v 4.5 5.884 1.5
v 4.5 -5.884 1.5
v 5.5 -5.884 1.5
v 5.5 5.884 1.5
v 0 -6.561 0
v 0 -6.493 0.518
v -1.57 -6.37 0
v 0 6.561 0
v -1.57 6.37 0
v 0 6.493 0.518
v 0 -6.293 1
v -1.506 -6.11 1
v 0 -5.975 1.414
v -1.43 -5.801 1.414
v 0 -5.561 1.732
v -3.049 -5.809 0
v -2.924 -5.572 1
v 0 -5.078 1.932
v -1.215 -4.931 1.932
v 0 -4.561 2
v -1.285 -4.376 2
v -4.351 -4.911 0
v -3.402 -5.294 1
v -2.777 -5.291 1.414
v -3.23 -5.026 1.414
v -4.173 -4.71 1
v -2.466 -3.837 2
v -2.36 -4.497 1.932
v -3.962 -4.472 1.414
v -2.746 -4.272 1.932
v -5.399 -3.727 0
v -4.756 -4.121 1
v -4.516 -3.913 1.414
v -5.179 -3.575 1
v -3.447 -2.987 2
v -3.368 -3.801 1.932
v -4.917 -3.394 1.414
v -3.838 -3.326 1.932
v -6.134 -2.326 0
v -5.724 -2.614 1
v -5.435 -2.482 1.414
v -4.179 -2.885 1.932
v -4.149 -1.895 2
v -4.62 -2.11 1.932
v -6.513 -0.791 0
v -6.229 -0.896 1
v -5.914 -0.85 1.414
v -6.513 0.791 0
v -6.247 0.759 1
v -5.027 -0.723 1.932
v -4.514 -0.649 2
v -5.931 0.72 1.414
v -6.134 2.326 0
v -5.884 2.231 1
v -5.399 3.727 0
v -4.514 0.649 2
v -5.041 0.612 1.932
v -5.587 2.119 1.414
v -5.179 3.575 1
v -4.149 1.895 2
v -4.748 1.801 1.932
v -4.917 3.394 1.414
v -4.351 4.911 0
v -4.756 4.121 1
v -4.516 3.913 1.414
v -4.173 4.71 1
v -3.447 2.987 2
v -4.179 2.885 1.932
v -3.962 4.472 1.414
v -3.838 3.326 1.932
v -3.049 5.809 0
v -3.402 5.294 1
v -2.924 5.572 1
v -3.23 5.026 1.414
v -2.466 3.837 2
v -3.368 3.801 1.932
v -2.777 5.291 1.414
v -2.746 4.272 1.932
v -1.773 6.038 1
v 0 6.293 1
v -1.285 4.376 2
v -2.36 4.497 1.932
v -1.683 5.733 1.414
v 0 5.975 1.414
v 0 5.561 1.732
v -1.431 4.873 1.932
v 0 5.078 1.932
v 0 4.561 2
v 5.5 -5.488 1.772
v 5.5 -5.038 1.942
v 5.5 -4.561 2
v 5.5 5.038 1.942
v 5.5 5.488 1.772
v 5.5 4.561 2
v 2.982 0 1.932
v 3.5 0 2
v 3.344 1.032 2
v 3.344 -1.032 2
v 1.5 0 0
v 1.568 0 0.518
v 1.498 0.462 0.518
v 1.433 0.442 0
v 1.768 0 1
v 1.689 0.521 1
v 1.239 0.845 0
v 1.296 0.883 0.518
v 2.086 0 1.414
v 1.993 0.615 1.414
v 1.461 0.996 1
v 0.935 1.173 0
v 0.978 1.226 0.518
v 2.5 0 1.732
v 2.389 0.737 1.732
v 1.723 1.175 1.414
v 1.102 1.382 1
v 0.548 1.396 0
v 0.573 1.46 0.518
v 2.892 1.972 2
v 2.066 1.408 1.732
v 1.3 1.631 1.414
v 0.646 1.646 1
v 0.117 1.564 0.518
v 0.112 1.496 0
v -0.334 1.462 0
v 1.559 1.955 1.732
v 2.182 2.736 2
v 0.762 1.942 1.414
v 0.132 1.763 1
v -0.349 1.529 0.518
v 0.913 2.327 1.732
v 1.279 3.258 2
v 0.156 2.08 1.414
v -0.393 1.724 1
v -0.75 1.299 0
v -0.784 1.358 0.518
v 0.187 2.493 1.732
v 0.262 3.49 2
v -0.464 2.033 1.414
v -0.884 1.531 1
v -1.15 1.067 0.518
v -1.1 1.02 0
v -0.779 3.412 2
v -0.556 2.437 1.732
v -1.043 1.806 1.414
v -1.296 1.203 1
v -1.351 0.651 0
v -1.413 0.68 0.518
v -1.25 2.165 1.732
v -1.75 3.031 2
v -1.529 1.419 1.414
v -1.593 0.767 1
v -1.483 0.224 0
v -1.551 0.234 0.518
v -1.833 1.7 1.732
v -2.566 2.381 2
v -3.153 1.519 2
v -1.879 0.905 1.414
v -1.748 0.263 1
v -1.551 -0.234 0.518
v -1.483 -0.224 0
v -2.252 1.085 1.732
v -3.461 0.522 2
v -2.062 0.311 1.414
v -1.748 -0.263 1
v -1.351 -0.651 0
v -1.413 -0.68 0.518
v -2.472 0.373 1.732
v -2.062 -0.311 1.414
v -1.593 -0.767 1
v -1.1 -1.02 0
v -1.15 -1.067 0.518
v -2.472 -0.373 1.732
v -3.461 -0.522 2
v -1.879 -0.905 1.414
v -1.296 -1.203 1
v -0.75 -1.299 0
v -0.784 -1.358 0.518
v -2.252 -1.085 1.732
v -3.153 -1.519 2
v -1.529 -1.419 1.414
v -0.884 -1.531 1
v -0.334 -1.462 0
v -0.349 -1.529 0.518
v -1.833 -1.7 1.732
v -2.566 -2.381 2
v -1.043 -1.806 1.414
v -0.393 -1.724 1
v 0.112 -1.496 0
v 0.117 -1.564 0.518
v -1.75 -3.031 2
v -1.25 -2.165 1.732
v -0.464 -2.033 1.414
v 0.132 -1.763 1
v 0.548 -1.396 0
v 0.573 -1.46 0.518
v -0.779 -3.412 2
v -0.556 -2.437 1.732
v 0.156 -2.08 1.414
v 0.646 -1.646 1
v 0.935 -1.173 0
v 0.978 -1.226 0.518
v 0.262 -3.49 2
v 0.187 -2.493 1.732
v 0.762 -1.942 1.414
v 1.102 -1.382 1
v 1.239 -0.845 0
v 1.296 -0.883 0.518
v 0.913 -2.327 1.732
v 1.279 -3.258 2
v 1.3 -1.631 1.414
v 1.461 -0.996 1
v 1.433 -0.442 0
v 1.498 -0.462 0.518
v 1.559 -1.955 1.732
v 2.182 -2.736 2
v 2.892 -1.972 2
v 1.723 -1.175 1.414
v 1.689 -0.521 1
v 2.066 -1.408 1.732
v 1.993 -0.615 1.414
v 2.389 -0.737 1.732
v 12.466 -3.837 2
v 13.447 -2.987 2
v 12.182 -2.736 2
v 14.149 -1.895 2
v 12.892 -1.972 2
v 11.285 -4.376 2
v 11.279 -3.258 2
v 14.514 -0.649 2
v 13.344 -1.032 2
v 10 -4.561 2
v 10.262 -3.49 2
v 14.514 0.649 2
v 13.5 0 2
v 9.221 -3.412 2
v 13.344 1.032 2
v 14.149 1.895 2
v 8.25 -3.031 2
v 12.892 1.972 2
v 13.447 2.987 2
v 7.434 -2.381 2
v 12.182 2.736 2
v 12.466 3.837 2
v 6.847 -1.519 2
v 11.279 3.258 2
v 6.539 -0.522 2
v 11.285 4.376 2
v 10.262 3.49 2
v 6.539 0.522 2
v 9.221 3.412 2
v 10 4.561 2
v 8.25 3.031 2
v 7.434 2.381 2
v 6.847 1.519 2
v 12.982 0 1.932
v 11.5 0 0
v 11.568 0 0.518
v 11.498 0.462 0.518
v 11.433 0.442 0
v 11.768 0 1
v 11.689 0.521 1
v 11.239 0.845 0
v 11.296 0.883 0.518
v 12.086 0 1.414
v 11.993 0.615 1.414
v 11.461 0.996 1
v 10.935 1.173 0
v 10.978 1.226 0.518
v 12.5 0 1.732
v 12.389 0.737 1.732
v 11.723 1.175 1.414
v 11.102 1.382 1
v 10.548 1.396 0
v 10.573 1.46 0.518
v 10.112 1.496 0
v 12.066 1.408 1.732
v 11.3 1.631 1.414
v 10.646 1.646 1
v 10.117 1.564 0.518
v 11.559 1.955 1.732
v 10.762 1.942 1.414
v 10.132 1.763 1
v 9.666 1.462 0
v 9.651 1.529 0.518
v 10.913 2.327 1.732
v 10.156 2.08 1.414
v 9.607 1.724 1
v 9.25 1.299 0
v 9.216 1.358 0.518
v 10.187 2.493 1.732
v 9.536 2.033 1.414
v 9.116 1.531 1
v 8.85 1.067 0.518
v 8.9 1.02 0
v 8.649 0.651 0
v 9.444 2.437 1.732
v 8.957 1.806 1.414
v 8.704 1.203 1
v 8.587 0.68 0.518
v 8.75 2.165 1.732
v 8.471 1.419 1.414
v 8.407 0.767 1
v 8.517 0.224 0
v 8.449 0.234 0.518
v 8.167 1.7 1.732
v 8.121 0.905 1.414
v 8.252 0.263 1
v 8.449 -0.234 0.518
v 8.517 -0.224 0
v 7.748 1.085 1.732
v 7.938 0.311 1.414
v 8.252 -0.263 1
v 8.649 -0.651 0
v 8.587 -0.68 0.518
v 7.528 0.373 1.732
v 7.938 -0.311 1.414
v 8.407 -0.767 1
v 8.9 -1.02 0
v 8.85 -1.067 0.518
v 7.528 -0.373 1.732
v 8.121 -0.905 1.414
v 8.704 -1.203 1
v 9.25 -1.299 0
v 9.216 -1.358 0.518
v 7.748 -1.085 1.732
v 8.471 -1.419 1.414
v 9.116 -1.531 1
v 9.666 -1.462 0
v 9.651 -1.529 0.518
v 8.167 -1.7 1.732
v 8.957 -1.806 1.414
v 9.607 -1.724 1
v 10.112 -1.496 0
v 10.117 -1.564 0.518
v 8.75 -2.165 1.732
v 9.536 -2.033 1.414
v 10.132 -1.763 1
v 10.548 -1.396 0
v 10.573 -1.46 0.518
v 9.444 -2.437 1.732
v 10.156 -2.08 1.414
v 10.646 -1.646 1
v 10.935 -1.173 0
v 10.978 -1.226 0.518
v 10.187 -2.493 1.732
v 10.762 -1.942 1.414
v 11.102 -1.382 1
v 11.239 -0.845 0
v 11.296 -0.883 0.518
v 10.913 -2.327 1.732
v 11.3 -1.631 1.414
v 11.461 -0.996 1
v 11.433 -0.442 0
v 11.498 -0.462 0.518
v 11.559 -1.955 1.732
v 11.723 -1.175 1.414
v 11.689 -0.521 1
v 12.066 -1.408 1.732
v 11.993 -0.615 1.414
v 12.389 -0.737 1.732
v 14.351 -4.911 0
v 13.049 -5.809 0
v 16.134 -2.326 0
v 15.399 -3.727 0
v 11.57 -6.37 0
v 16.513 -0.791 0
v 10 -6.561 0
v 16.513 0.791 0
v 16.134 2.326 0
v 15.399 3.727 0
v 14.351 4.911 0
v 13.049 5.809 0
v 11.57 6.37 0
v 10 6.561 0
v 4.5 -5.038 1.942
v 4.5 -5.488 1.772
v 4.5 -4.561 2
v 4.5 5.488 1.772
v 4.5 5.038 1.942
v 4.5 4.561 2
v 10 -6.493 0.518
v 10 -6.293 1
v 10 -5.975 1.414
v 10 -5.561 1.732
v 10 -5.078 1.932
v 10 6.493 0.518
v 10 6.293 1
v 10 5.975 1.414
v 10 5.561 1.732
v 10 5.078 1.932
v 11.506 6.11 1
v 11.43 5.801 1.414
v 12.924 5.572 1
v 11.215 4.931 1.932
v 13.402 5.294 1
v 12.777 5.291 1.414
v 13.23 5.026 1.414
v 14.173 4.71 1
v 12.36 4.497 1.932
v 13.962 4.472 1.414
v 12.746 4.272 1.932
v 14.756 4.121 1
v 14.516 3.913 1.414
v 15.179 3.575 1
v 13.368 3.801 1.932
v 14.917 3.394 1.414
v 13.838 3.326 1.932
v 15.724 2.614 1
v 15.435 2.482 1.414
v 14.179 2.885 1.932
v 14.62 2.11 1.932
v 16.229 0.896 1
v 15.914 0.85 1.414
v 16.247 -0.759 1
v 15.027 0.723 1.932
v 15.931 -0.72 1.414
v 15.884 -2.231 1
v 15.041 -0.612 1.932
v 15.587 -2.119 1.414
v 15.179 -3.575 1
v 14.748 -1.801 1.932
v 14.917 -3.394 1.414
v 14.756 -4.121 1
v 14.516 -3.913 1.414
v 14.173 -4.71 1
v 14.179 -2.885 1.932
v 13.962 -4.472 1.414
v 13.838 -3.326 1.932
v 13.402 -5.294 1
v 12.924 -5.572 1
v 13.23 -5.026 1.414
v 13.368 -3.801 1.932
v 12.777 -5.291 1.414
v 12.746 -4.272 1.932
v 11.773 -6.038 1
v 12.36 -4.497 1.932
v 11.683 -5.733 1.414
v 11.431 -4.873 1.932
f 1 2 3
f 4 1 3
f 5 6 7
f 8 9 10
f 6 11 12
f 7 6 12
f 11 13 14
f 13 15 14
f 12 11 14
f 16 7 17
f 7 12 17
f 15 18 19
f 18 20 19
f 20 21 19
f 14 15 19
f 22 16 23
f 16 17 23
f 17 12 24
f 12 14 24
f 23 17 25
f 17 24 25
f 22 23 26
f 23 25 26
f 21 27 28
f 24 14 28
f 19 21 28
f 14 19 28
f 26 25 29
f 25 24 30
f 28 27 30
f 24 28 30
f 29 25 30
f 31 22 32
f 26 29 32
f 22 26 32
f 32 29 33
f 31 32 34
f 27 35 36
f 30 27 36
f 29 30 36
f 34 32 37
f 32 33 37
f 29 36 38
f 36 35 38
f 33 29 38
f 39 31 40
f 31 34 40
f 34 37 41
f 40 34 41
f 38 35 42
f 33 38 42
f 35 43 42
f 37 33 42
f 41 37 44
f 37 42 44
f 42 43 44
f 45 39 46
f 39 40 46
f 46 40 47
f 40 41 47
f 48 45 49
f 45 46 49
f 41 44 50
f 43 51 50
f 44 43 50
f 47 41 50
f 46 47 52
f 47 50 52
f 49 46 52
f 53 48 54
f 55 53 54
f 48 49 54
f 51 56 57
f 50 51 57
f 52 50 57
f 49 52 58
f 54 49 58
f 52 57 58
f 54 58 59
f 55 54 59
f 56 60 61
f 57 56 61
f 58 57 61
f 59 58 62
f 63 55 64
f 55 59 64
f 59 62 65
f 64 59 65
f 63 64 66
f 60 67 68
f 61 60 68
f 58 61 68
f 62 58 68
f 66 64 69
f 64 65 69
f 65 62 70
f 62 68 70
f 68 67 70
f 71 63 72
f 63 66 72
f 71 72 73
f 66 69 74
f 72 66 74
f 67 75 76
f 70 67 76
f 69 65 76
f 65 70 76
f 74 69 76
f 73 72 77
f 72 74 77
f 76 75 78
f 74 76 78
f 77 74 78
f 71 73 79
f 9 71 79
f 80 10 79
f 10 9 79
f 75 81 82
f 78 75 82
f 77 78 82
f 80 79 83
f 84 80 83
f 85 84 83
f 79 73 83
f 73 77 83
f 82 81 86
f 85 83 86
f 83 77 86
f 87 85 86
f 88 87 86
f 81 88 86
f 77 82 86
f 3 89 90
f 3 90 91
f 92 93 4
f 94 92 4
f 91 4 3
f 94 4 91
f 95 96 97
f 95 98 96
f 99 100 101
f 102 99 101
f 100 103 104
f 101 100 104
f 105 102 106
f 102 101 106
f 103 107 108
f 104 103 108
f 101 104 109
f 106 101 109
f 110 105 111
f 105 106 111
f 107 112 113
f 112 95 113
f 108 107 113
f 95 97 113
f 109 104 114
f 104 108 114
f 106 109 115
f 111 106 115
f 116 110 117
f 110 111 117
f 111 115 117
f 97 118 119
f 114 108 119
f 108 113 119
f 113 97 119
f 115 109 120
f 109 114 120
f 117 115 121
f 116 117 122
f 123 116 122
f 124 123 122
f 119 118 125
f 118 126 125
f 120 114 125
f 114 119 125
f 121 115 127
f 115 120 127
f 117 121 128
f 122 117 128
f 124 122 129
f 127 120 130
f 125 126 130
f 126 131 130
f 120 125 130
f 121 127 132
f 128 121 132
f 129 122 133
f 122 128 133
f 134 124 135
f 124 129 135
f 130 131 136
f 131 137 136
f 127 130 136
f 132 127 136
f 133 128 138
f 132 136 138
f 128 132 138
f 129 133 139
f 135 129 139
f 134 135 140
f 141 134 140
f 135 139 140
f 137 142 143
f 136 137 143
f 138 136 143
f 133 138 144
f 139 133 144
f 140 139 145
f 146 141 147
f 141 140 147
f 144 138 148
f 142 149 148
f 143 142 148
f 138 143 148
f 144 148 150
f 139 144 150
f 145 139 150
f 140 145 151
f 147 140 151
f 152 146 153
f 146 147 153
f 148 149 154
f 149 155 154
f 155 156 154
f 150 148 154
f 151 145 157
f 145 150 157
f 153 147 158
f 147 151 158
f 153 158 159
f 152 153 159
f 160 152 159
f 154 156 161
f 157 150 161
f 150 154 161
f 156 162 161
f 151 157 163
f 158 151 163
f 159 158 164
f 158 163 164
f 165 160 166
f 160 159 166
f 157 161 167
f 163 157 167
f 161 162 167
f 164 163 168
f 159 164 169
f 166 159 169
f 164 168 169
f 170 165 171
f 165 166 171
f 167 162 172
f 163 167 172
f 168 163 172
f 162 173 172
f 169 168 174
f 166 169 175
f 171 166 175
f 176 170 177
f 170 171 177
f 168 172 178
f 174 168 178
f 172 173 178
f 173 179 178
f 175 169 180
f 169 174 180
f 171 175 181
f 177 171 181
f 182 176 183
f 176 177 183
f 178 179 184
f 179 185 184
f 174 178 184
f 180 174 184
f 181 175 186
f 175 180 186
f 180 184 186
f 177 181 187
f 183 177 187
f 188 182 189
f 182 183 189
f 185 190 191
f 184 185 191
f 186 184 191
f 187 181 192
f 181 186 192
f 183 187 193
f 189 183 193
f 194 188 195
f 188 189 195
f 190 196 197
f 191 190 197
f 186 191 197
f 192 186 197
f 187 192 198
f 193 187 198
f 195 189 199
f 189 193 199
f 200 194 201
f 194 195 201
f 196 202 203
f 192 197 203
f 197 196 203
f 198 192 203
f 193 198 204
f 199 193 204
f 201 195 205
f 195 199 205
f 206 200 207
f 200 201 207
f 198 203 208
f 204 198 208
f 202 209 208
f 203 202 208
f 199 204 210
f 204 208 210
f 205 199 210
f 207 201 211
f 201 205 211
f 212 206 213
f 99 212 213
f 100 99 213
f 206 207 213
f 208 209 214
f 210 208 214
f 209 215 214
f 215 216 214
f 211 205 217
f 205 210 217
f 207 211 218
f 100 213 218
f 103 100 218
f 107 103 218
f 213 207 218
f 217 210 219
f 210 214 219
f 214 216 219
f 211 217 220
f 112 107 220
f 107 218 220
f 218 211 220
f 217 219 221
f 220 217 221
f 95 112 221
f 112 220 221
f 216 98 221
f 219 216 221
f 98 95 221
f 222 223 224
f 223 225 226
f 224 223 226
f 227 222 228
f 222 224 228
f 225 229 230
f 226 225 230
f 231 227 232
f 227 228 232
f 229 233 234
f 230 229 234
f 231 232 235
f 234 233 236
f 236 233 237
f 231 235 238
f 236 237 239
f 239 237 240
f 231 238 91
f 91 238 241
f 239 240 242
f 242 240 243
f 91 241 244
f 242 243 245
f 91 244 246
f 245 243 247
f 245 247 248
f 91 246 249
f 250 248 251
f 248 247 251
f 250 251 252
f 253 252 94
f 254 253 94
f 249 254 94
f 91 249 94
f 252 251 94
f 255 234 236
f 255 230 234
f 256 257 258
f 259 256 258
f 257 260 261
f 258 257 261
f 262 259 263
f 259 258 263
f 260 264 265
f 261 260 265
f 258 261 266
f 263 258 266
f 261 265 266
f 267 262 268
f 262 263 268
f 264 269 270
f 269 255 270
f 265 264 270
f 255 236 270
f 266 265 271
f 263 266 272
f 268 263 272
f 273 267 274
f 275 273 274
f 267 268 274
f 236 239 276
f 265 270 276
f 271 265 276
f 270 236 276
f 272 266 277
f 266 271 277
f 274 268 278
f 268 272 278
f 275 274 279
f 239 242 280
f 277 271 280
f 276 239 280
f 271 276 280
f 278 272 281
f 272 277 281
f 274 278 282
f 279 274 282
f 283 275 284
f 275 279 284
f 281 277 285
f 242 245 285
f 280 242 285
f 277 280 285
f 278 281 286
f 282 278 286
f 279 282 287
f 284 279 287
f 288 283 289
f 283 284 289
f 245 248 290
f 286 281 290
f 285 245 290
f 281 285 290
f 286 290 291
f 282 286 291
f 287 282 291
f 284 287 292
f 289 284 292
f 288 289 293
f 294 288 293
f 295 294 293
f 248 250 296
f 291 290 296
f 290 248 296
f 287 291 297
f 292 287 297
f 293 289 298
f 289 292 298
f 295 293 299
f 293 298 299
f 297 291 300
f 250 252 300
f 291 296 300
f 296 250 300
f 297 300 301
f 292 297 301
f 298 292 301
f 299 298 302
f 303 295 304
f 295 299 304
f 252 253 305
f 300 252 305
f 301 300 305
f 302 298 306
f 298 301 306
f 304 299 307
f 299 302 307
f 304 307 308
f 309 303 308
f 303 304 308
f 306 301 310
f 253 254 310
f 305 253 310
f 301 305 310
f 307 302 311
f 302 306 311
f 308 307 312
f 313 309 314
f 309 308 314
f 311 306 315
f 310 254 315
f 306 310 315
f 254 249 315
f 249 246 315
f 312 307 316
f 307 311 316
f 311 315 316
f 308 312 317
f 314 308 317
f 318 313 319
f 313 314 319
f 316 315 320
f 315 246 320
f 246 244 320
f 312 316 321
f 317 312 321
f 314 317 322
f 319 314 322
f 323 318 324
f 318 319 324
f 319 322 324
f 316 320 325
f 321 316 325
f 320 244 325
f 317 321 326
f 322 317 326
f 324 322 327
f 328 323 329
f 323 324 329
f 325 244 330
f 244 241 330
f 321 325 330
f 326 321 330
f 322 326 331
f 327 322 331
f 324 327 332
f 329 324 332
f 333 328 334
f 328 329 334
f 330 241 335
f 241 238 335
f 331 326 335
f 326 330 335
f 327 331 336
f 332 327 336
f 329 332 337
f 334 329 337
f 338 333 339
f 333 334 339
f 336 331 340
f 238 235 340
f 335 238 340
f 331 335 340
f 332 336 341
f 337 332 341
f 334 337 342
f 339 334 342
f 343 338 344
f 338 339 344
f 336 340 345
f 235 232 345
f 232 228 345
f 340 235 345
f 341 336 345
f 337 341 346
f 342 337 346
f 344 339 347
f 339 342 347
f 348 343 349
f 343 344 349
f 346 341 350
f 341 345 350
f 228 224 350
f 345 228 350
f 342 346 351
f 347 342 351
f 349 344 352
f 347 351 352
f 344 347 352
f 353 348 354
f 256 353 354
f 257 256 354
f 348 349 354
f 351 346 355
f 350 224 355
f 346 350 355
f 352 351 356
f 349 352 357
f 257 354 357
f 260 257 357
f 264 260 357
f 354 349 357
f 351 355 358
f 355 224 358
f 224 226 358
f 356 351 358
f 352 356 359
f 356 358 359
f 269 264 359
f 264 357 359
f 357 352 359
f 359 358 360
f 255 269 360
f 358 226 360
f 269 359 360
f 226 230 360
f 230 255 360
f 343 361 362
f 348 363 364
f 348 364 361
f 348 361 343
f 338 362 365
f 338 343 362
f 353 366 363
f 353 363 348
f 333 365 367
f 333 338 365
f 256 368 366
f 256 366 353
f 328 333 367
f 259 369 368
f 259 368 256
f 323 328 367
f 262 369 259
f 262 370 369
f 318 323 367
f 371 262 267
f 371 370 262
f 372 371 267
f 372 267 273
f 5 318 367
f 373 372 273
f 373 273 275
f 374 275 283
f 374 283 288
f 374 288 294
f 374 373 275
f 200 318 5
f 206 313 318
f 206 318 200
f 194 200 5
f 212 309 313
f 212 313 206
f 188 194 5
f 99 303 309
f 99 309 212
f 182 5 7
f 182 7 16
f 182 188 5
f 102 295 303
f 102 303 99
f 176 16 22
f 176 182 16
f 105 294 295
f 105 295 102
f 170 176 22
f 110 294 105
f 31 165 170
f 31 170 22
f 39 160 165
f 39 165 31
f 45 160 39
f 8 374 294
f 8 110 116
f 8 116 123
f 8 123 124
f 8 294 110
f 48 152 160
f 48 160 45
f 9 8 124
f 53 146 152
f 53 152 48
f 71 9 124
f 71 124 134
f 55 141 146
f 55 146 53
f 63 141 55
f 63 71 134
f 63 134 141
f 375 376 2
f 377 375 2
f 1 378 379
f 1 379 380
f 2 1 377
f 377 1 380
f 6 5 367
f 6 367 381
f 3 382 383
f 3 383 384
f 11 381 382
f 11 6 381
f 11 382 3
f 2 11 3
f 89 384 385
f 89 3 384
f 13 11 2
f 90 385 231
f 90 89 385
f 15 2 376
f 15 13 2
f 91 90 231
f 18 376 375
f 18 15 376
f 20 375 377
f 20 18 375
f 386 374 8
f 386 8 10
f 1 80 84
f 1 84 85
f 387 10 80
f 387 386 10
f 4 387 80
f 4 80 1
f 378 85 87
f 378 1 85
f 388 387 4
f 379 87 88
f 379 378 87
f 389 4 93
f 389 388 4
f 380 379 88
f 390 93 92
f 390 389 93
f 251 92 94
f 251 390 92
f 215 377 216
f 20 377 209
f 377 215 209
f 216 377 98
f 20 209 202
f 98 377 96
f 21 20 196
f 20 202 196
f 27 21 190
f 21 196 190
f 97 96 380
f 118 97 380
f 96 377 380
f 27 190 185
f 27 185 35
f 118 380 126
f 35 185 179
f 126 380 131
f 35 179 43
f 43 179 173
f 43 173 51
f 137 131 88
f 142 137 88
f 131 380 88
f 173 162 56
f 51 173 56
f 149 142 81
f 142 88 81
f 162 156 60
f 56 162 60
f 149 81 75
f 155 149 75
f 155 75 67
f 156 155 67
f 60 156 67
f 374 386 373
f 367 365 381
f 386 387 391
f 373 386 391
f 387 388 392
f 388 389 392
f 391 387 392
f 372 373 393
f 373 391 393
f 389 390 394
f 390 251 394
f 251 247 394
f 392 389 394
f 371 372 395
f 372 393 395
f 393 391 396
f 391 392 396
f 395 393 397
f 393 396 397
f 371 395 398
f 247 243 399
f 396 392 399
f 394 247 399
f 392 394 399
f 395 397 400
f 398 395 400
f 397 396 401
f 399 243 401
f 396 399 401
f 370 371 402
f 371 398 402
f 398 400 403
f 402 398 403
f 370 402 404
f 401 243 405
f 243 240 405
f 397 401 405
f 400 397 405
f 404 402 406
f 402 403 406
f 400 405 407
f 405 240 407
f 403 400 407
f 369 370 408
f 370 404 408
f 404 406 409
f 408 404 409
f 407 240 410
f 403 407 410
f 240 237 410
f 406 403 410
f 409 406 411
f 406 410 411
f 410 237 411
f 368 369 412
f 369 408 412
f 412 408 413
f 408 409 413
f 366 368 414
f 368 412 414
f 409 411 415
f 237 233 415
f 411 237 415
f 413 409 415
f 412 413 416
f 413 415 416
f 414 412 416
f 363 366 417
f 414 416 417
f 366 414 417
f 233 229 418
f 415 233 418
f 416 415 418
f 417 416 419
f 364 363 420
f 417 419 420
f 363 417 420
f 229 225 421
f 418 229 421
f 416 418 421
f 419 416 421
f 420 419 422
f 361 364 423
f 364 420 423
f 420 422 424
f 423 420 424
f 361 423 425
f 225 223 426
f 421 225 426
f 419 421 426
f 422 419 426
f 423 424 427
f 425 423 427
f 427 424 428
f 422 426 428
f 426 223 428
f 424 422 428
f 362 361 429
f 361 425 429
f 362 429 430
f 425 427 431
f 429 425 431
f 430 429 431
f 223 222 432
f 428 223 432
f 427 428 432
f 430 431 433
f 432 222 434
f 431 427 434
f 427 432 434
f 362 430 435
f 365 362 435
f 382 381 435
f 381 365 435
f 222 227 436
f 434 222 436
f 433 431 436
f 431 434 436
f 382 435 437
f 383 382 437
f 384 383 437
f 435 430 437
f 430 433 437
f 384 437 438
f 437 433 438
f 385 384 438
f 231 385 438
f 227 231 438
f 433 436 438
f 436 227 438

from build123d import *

# Parameters (mm, degrees)
SKETCH_1_R          = 1.5
EXTRUDE_1_DEPTH     = 2
FILLET_1_R          = 2
SKETCH_2_W          = 1
SKETCH_2_H          = 1
CUT_EXTRUDE_1_DEPTH = 50


with BuildPart() as part:
    # 草图1 → 凸台-拉伸1 (new body)
    with BuildSketch(Plane.XY):
        with BuildLine():
            Line((0, 6.560739839), (10, 6.560739839))
            ThreePointArc((10, 6.560739839), (16.560739839, 0), (10, -6.560739839))
            Line((10, -6.560739839), (0, -6.560739839))
            ThreePointArc((0, -6.560739839), (-6.560739839, 0), (0, 6.560739839))
        make_face()
        Circle(SKETCH_1_R, mode=Mode.SUBTRACT)
        with Locations((10, 0)):
            Circle(SKETCH_1_R, mode=Mode.SUBTRACT)
    extrude(amount=EXTRUDE_1_DEPTH)

    # 圆角1
    fillet_1_edges = [part.edges().sort_by_distance(p)[0] for p in [
        (8.5, 0, 2),
        (5, 6.560739839, 2),
        (16.560739839, 0, 2),
        (5, -6.560739839, 2),
        (-6.560739839, 0, 2),
        (-1.5, 0, 2),
    ]]
    fillet(fillet_1_edges, radius=FILLET_1_R - 0.0001)  # a hair under: the kernel refuses the full size

    # 草图2 → 切除-拉伸1 (cut, symmetric)
    with BuildSketch(Plane(origin=(0, 0, 0), x_dir=(1, 0, 0), z_dir=(0, 1, 0))):
        with Locations((5, -2)):
            Rectangle(SKETCH_2_W, SKETCH_2_H)
    extrude(amount=CUT_EXTRUDE_1_DEPTH, both=True, mode=Mode.SUBTRACT)


solid = part.part
